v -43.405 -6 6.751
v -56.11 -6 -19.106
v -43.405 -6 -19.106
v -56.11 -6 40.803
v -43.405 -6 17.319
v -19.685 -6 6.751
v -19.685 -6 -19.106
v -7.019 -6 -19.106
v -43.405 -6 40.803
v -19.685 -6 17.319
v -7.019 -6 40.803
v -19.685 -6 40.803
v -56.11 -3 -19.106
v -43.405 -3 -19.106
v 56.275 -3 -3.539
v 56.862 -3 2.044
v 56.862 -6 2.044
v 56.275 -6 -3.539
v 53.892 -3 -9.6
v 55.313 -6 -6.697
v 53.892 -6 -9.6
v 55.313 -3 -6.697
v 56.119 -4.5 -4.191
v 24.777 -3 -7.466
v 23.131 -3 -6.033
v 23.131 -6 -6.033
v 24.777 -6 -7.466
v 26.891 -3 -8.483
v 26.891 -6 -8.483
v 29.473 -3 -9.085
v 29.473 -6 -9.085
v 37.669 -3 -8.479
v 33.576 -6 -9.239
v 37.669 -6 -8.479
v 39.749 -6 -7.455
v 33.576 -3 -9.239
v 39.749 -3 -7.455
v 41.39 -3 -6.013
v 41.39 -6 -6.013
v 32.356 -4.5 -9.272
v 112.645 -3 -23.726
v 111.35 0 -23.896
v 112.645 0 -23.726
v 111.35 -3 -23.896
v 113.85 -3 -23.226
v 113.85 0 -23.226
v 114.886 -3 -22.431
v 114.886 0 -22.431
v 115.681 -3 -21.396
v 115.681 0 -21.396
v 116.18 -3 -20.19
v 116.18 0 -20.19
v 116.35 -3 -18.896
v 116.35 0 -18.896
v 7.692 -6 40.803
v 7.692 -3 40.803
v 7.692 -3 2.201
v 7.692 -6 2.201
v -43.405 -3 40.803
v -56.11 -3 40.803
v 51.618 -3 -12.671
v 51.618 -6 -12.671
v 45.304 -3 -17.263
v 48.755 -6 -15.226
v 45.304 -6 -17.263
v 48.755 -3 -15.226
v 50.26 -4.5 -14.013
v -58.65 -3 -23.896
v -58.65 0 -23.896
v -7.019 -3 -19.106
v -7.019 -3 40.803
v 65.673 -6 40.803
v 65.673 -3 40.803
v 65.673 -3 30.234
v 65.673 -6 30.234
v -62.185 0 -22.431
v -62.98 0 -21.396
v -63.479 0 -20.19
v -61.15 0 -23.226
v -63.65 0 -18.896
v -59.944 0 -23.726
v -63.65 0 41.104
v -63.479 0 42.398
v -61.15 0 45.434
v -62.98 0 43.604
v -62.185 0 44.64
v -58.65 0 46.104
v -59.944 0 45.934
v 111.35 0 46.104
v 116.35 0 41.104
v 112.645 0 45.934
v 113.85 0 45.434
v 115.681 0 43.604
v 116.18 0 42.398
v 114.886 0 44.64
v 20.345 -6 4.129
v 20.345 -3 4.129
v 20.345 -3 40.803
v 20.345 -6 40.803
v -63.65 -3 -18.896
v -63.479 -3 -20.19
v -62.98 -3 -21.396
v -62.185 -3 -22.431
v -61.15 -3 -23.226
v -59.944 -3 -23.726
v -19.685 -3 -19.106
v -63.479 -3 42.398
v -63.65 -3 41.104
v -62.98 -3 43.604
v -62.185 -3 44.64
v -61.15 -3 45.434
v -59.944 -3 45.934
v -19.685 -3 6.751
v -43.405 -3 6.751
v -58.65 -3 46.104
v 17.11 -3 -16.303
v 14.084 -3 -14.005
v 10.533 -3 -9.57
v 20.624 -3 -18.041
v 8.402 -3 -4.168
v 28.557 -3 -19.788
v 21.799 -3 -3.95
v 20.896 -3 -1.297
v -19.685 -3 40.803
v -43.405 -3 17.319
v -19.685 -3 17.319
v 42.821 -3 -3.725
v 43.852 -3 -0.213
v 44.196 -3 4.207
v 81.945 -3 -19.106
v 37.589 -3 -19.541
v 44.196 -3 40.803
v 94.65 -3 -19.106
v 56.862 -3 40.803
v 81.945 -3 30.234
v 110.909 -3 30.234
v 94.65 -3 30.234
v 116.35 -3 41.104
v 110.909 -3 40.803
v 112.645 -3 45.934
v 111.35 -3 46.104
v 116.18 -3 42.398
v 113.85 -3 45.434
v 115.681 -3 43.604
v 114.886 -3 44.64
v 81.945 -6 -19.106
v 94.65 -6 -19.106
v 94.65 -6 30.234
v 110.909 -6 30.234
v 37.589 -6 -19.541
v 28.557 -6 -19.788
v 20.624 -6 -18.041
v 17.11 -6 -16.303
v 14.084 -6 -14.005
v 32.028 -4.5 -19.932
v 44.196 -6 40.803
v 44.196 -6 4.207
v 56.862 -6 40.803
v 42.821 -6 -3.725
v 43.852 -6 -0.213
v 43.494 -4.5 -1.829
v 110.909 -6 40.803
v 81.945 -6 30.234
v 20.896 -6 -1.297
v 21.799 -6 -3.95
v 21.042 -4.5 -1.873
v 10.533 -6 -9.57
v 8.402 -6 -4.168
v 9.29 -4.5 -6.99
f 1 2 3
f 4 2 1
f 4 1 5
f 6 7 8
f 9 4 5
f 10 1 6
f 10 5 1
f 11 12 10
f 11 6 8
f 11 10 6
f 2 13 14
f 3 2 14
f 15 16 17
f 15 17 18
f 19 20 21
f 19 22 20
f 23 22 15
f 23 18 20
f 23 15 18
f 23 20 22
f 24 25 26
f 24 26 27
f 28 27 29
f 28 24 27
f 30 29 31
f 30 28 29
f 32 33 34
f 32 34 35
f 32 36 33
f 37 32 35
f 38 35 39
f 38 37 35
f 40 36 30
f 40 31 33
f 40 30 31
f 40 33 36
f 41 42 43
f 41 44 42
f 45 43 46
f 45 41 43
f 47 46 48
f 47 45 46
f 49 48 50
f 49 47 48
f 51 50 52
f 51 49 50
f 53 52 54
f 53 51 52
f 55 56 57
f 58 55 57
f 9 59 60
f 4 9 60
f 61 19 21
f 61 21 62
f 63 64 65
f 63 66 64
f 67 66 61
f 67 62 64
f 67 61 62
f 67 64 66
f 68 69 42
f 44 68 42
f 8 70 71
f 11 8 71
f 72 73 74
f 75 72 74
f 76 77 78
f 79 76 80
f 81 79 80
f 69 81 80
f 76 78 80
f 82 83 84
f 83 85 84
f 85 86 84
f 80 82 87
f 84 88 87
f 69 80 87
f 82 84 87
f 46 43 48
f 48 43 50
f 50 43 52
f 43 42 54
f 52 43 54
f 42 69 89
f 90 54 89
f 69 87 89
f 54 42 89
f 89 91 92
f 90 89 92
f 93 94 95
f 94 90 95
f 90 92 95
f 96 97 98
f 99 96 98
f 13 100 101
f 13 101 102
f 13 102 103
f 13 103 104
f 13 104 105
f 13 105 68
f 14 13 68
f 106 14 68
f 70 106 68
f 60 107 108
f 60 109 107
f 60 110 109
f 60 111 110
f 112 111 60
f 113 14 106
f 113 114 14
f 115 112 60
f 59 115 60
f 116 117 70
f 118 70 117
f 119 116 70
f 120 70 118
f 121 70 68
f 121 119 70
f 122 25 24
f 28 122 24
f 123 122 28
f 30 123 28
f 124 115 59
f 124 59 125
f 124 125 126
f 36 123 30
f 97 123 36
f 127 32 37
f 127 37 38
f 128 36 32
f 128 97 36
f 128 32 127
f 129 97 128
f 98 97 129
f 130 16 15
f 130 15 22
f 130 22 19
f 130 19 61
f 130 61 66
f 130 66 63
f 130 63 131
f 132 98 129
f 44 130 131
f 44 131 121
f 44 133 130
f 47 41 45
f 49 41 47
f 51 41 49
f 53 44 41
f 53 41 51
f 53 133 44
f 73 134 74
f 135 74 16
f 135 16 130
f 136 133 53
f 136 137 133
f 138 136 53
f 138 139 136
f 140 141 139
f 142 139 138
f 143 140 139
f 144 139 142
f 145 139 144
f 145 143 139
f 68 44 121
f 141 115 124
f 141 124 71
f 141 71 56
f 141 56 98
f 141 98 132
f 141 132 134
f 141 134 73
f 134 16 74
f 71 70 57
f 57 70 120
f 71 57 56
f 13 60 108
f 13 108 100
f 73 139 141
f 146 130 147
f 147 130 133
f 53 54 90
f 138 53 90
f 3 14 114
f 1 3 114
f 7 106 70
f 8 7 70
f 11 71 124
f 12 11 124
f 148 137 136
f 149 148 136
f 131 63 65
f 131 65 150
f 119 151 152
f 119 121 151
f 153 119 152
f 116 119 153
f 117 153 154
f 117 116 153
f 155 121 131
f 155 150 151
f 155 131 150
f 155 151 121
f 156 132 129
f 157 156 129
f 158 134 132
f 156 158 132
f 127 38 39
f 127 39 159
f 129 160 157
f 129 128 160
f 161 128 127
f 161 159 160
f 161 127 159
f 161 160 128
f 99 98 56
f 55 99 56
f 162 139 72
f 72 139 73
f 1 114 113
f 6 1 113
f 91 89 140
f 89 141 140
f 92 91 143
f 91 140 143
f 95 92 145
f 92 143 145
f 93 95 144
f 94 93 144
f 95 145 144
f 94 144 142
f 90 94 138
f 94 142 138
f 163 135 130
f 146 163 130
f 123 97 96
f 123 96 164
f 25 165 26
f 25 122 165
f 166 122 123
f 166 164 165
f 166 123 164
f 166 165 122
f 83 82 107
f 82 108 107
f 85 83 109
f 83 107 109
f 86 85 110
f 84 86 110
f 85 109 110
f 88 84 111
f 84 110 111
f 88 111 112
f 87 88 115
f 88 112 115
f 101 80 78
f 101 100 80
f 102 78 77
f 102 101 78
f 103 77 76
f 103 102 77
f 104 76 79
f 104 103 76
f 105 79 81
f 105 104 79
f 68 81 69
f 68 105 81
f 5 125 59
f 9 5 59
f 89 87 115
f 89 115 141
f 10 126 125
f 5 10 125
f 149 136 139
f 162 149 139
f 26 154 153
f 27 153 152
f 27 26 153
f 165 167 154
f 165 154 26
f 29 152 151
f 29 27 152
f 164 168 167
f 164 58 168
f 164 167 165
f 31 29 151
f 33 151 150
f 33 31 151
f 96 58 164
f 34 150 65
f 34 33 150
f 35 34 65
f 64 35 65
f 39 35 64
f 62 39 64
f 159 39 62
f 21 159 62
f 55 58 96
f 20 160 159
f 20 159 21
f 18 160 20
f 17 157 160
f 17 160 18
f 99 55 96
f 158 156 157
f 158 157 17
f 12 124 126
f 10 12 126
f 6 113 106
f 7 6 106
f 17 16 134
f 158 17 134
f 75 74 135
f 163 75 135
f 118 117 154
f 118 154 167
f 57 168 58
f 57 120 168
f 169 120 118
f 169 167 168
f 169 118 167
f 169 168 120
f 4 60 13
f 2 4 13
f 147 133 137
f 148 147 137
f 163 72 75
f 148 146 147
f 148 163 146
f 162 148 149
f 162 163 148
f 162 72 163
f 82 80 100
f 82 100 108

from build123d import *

# Parameters (mm, degrees)
F1_DEPTH = 6
F0_W     = 180
F0_H     = 70
F2_DEPTH = 3
F3_DEPTH = 6
F4_DEPTH = 6
F5_R     = 5


with BuildPart() as f1:
    # F0 (on Front) → F1 (new body)
    with BuildSketch(Plane.XZ):
        Polygon((-19.6854011617, -19.1057036918), (-7.0193172456, -19.1057036918), (-7.0193172456, 40.8025130914), (-19.6854011617, 40.8025130914), (-19.6854011617, 17.319121483), (-43.4048067561, 17.319121483), (-43.4048067561, 40.8025130914), (-56.1102263365, 40.8025130914), (-56.1102263365, -19.1057036918), (-43.4048067561, -19.1057036918), (-43.4048067561, 6.7509396648), (-19.6854011617, 6.7509396648), align=None)
    extrude(amount=F1_DEPTH)

    # F0 (on Front) → F2 (join)
    with BuildSketch(Plane.XZ):
        with Locations((26.3504379991, 11.104086518)):
            Rectangle(F0_W, F0_H)
        Polygon((-7.0193172456, 40.8025130914), (-7.0193172456, -19.1057036918), (-19.6854011617, -19.1057036918), (-19.6854011617, 6.7509396648), (-43.4048067561, 6.7509396648), (-43.4048067561, -19.1057036918), (-56.1102263365, -19.1057036918), (-56.1102263365, 40.8025130914), (-43.4048067561, 40.8025130914), (-43.4048067561, 17.319121483), (-19.6854011617, 17.319121483), (-19.6854011617, 40.8025130914), align=None, mode=Mode.SUBTRACT)
        with BuildLine():
            Line((44.1957177194, 40.8025130914), (56.8618016355, 40.8025130914))
            Line((56.8618016355, 40.8025130914), (56.8618016355, 2.0437718327))
            add(Edge.make_bspline(
                [(56.8618016355, 2.0437718327), (56.8618016355, -4.6039554401), (53.8919589781, -9.5995848107)],
                knots=[0, 0, 0, 1, 1, 1], degree=2))
            add(Edge.make_bspline(
                [(53.8919589781, -9.5995848107), (50.9221163208, -14.5952141813), (45.3036722649, -17.2634834121)],
                knots=[0, 0, 0, 1, 1, 1], degree=2))
            add(Edge.make_bspline(
                [(45.3036722649, -17.2634834121), (39.6852282089, -19.9317526429), (32.0278855516, -19.9317526429)],
                knots=[0, 0, 0, 1, 1, 1], degree=2))
            add(Edge.make_bspline(
                [(32.0278855516, -19.9317526429), (20.476312125, -19.9317526429), (14.0842666704, -14.0051792163)],
                knots=[0, 0, 0, 1, 1, 1], degree=2))
            add(Edge.make_bspline(
                [(14.0842666704, -14.0051792163), (7.6922212159, -8.0786057897), (7.6922212159, 2.20111449)],
                knots=[0, 0, 0, 1, 1, 1], degree=2))
            Line((7.6922212159, 2.20111449), (7.6922212159, 40.8025130914))
            Line((7.6922212159, 40.8025130914), (20.3451932439, 40.8025130914))
            Line((20.3451932439, 40.8025130914), (20.3451932439, 4.1285620424))
            add(Edge.make_bspline(
                [(20.3451932439, 4.1285620424), (20.3451932439, -2.7945148806), (23.1314694677, -6.0331512443)],
                knots=[0, 0, 0, 1, 1, 1], degree=2))
            add(Edge.make_bspline(
                [(23.1314694677, -6.0331512443), (25.9177456914, -9.2717876079), (32.3556827544, -9.2717876079)],
                knots=[0, 0, 0, 1, 1, 1], degree=2))
            add(Edge.make_bspline(
                [(32.3556827544, -9.2717876079), (38.5838296075, -9.2717876079), (41.3897736635, -6.0134834121)],
                knots=[0, 0, 0, 1, 1, 1], degree=2))
            add(Edge.make_bspline(
                [(41.3897736635, -6.0134834121), (44.1957177194, -2.7551792163), (44.1957177194, 4.2072333711)],
                knots=[0, 0, 0, 1, 1, 1], degree=2))
            Line((44.1957177194, 4.2072333711), (44.1957177194, 40.8025130914))
        make_face(mode=Mode.SUBTRACT)
        Polygon((94.6502631739, 30.2343312732), (94.6502631739, -19.1057036918), (81.9448435935, -19.1057036918), (81.9448435935, 30.2343312732), (65.6729904467, 30.2343312732), (65.6729904467, 40.8025130914), (110.9090044327, 40.8025130914), (110.9090044327, 30.2343312732), align=None, mode=Mode.SUBTRACT)
    extrude(amount=F2_DEPTH)

    # F0 (on Front) → F3 (join)
    with BuildSketch(Plane.XZ):
        with BuildLine():
            Line((56.8618016355, 2.0437718327), (56.8618016355, 40.8025130914))
            Line((56.8618016355, 40.8025130914), (44.1957177194, 40.8025130914))
            Line((44.1957177194, 40.8025130914), (44.1957177194, 4.2072333711))
            add(Edge.make_bspline(
                [(41.3897736635, -6.0134834121), (44.1957177194, -2.7551792163), (44.1957177194, 4.2072333711)],
                knots=[0, 0, 0, 1, 1, 1], degree=2))
            add(Edge.make_bspline(
                [(32.3556827544, -9.2717876079), (38.5838296075, -9.2717876079), (41.3897736635, -6.0134834121)],
                knots=[0, 0, 0, 1, 1, 1], degree=2))
            add(Edge.make_bspline(
                [(23.1314694677, -6.0331512443), (25.9177456914, -9.2717876079), (32.3556827544, -9.2717876079)],
                knots=[0, 0, 0, 1, 1, 1], degree=2))
            add(Edge.make_bspline(
                [(20.3451932439, 4.1285620424), (20.3451932439, -2.7945148806), (23.1314694677, -6.0331512443)],
                knots=[0, 0, 0, 1, 1, 1], degree=2))
            Line((20.3451932439, 4.1285620424), (20.3451932439, 40.8025130914))
            Line((20.3451932439, 40.8025130914), (7.6922212159, 40.8025130914))
            Line((7.6922212159, 40.8025130914), (7.6922212159, 2.20111449))
            add(Edge.make_bspline(
                [(14.0842666704, -14.0051792163), (7.6922212159, -8.0786057897), (7.6922212159, 2.20111449)],
                knots=[0, 0, 0, 1, 1, 1], degree=2))
            add(Edge.make_bspline(
                [(32.0278855516, -19.9317526429), (20.476312125, -19.9317526429), (14.0842666704, -14.0051792163)],
                knots=[0, 0, 0, 1, 1, 1], degree=2))
            add(Edge.make_bspline(
                [(45.3036722649, -17.2634834121), (39.6852282089, -19.9317526429), (32.0278855516, -19.9317526429)],
                knots=[0, 0, 0, 1, 1, 1], degree=2))
            add(Edge.make_bspline(
                [(53.8919589781, -9.5995848107), (50.9221163208, -14.5952141813), (45.3036722649, -17.2634834121)],
                knots=[0, 0, 0, 1, 1, 1], degree=2))
            add(Edge.make_bspline(
                [(56.8618016355, 2.0437718327), (56.8618016355, -4.6039554401), (53.8919589781, -9.5995848107)],
                knots=[0, 0, 0, 1, 1, 1], degree=2))
        make_face()
    extrude(amount=F3_DEPTH)

    # F0 (on Front) → F4 (join)
    with BuildSketch(Plane.XZ):
        Polygon((81.9448435935, -19.1057036918), (94.6502631739, -19.1057036918), (94.6502631739, 30.2343312732), (110.9090044327, 30.2343312732), (110.9090044327, 40.8025130914), (65.6729904467, 40.8025130914), (65.6729904467, 30.2343312732), (81.9448435935, 30.2343312732), align=None)
    extrude(amount=F4_DEPTH)

    # F5
    f5_edges = [f1.edges().sort_by_distance(p)[0] for p in [
        (-63.649562, -1.5, 46.104087),
        (116.350438, -1.5, 46.104087),
        (-63.649562, -1.5, -23.895913),
        (116.350438, -1.5, -23.895913),
    ]]
    fillet(f5_edges, radius=F5_R)


solid = f1.part
